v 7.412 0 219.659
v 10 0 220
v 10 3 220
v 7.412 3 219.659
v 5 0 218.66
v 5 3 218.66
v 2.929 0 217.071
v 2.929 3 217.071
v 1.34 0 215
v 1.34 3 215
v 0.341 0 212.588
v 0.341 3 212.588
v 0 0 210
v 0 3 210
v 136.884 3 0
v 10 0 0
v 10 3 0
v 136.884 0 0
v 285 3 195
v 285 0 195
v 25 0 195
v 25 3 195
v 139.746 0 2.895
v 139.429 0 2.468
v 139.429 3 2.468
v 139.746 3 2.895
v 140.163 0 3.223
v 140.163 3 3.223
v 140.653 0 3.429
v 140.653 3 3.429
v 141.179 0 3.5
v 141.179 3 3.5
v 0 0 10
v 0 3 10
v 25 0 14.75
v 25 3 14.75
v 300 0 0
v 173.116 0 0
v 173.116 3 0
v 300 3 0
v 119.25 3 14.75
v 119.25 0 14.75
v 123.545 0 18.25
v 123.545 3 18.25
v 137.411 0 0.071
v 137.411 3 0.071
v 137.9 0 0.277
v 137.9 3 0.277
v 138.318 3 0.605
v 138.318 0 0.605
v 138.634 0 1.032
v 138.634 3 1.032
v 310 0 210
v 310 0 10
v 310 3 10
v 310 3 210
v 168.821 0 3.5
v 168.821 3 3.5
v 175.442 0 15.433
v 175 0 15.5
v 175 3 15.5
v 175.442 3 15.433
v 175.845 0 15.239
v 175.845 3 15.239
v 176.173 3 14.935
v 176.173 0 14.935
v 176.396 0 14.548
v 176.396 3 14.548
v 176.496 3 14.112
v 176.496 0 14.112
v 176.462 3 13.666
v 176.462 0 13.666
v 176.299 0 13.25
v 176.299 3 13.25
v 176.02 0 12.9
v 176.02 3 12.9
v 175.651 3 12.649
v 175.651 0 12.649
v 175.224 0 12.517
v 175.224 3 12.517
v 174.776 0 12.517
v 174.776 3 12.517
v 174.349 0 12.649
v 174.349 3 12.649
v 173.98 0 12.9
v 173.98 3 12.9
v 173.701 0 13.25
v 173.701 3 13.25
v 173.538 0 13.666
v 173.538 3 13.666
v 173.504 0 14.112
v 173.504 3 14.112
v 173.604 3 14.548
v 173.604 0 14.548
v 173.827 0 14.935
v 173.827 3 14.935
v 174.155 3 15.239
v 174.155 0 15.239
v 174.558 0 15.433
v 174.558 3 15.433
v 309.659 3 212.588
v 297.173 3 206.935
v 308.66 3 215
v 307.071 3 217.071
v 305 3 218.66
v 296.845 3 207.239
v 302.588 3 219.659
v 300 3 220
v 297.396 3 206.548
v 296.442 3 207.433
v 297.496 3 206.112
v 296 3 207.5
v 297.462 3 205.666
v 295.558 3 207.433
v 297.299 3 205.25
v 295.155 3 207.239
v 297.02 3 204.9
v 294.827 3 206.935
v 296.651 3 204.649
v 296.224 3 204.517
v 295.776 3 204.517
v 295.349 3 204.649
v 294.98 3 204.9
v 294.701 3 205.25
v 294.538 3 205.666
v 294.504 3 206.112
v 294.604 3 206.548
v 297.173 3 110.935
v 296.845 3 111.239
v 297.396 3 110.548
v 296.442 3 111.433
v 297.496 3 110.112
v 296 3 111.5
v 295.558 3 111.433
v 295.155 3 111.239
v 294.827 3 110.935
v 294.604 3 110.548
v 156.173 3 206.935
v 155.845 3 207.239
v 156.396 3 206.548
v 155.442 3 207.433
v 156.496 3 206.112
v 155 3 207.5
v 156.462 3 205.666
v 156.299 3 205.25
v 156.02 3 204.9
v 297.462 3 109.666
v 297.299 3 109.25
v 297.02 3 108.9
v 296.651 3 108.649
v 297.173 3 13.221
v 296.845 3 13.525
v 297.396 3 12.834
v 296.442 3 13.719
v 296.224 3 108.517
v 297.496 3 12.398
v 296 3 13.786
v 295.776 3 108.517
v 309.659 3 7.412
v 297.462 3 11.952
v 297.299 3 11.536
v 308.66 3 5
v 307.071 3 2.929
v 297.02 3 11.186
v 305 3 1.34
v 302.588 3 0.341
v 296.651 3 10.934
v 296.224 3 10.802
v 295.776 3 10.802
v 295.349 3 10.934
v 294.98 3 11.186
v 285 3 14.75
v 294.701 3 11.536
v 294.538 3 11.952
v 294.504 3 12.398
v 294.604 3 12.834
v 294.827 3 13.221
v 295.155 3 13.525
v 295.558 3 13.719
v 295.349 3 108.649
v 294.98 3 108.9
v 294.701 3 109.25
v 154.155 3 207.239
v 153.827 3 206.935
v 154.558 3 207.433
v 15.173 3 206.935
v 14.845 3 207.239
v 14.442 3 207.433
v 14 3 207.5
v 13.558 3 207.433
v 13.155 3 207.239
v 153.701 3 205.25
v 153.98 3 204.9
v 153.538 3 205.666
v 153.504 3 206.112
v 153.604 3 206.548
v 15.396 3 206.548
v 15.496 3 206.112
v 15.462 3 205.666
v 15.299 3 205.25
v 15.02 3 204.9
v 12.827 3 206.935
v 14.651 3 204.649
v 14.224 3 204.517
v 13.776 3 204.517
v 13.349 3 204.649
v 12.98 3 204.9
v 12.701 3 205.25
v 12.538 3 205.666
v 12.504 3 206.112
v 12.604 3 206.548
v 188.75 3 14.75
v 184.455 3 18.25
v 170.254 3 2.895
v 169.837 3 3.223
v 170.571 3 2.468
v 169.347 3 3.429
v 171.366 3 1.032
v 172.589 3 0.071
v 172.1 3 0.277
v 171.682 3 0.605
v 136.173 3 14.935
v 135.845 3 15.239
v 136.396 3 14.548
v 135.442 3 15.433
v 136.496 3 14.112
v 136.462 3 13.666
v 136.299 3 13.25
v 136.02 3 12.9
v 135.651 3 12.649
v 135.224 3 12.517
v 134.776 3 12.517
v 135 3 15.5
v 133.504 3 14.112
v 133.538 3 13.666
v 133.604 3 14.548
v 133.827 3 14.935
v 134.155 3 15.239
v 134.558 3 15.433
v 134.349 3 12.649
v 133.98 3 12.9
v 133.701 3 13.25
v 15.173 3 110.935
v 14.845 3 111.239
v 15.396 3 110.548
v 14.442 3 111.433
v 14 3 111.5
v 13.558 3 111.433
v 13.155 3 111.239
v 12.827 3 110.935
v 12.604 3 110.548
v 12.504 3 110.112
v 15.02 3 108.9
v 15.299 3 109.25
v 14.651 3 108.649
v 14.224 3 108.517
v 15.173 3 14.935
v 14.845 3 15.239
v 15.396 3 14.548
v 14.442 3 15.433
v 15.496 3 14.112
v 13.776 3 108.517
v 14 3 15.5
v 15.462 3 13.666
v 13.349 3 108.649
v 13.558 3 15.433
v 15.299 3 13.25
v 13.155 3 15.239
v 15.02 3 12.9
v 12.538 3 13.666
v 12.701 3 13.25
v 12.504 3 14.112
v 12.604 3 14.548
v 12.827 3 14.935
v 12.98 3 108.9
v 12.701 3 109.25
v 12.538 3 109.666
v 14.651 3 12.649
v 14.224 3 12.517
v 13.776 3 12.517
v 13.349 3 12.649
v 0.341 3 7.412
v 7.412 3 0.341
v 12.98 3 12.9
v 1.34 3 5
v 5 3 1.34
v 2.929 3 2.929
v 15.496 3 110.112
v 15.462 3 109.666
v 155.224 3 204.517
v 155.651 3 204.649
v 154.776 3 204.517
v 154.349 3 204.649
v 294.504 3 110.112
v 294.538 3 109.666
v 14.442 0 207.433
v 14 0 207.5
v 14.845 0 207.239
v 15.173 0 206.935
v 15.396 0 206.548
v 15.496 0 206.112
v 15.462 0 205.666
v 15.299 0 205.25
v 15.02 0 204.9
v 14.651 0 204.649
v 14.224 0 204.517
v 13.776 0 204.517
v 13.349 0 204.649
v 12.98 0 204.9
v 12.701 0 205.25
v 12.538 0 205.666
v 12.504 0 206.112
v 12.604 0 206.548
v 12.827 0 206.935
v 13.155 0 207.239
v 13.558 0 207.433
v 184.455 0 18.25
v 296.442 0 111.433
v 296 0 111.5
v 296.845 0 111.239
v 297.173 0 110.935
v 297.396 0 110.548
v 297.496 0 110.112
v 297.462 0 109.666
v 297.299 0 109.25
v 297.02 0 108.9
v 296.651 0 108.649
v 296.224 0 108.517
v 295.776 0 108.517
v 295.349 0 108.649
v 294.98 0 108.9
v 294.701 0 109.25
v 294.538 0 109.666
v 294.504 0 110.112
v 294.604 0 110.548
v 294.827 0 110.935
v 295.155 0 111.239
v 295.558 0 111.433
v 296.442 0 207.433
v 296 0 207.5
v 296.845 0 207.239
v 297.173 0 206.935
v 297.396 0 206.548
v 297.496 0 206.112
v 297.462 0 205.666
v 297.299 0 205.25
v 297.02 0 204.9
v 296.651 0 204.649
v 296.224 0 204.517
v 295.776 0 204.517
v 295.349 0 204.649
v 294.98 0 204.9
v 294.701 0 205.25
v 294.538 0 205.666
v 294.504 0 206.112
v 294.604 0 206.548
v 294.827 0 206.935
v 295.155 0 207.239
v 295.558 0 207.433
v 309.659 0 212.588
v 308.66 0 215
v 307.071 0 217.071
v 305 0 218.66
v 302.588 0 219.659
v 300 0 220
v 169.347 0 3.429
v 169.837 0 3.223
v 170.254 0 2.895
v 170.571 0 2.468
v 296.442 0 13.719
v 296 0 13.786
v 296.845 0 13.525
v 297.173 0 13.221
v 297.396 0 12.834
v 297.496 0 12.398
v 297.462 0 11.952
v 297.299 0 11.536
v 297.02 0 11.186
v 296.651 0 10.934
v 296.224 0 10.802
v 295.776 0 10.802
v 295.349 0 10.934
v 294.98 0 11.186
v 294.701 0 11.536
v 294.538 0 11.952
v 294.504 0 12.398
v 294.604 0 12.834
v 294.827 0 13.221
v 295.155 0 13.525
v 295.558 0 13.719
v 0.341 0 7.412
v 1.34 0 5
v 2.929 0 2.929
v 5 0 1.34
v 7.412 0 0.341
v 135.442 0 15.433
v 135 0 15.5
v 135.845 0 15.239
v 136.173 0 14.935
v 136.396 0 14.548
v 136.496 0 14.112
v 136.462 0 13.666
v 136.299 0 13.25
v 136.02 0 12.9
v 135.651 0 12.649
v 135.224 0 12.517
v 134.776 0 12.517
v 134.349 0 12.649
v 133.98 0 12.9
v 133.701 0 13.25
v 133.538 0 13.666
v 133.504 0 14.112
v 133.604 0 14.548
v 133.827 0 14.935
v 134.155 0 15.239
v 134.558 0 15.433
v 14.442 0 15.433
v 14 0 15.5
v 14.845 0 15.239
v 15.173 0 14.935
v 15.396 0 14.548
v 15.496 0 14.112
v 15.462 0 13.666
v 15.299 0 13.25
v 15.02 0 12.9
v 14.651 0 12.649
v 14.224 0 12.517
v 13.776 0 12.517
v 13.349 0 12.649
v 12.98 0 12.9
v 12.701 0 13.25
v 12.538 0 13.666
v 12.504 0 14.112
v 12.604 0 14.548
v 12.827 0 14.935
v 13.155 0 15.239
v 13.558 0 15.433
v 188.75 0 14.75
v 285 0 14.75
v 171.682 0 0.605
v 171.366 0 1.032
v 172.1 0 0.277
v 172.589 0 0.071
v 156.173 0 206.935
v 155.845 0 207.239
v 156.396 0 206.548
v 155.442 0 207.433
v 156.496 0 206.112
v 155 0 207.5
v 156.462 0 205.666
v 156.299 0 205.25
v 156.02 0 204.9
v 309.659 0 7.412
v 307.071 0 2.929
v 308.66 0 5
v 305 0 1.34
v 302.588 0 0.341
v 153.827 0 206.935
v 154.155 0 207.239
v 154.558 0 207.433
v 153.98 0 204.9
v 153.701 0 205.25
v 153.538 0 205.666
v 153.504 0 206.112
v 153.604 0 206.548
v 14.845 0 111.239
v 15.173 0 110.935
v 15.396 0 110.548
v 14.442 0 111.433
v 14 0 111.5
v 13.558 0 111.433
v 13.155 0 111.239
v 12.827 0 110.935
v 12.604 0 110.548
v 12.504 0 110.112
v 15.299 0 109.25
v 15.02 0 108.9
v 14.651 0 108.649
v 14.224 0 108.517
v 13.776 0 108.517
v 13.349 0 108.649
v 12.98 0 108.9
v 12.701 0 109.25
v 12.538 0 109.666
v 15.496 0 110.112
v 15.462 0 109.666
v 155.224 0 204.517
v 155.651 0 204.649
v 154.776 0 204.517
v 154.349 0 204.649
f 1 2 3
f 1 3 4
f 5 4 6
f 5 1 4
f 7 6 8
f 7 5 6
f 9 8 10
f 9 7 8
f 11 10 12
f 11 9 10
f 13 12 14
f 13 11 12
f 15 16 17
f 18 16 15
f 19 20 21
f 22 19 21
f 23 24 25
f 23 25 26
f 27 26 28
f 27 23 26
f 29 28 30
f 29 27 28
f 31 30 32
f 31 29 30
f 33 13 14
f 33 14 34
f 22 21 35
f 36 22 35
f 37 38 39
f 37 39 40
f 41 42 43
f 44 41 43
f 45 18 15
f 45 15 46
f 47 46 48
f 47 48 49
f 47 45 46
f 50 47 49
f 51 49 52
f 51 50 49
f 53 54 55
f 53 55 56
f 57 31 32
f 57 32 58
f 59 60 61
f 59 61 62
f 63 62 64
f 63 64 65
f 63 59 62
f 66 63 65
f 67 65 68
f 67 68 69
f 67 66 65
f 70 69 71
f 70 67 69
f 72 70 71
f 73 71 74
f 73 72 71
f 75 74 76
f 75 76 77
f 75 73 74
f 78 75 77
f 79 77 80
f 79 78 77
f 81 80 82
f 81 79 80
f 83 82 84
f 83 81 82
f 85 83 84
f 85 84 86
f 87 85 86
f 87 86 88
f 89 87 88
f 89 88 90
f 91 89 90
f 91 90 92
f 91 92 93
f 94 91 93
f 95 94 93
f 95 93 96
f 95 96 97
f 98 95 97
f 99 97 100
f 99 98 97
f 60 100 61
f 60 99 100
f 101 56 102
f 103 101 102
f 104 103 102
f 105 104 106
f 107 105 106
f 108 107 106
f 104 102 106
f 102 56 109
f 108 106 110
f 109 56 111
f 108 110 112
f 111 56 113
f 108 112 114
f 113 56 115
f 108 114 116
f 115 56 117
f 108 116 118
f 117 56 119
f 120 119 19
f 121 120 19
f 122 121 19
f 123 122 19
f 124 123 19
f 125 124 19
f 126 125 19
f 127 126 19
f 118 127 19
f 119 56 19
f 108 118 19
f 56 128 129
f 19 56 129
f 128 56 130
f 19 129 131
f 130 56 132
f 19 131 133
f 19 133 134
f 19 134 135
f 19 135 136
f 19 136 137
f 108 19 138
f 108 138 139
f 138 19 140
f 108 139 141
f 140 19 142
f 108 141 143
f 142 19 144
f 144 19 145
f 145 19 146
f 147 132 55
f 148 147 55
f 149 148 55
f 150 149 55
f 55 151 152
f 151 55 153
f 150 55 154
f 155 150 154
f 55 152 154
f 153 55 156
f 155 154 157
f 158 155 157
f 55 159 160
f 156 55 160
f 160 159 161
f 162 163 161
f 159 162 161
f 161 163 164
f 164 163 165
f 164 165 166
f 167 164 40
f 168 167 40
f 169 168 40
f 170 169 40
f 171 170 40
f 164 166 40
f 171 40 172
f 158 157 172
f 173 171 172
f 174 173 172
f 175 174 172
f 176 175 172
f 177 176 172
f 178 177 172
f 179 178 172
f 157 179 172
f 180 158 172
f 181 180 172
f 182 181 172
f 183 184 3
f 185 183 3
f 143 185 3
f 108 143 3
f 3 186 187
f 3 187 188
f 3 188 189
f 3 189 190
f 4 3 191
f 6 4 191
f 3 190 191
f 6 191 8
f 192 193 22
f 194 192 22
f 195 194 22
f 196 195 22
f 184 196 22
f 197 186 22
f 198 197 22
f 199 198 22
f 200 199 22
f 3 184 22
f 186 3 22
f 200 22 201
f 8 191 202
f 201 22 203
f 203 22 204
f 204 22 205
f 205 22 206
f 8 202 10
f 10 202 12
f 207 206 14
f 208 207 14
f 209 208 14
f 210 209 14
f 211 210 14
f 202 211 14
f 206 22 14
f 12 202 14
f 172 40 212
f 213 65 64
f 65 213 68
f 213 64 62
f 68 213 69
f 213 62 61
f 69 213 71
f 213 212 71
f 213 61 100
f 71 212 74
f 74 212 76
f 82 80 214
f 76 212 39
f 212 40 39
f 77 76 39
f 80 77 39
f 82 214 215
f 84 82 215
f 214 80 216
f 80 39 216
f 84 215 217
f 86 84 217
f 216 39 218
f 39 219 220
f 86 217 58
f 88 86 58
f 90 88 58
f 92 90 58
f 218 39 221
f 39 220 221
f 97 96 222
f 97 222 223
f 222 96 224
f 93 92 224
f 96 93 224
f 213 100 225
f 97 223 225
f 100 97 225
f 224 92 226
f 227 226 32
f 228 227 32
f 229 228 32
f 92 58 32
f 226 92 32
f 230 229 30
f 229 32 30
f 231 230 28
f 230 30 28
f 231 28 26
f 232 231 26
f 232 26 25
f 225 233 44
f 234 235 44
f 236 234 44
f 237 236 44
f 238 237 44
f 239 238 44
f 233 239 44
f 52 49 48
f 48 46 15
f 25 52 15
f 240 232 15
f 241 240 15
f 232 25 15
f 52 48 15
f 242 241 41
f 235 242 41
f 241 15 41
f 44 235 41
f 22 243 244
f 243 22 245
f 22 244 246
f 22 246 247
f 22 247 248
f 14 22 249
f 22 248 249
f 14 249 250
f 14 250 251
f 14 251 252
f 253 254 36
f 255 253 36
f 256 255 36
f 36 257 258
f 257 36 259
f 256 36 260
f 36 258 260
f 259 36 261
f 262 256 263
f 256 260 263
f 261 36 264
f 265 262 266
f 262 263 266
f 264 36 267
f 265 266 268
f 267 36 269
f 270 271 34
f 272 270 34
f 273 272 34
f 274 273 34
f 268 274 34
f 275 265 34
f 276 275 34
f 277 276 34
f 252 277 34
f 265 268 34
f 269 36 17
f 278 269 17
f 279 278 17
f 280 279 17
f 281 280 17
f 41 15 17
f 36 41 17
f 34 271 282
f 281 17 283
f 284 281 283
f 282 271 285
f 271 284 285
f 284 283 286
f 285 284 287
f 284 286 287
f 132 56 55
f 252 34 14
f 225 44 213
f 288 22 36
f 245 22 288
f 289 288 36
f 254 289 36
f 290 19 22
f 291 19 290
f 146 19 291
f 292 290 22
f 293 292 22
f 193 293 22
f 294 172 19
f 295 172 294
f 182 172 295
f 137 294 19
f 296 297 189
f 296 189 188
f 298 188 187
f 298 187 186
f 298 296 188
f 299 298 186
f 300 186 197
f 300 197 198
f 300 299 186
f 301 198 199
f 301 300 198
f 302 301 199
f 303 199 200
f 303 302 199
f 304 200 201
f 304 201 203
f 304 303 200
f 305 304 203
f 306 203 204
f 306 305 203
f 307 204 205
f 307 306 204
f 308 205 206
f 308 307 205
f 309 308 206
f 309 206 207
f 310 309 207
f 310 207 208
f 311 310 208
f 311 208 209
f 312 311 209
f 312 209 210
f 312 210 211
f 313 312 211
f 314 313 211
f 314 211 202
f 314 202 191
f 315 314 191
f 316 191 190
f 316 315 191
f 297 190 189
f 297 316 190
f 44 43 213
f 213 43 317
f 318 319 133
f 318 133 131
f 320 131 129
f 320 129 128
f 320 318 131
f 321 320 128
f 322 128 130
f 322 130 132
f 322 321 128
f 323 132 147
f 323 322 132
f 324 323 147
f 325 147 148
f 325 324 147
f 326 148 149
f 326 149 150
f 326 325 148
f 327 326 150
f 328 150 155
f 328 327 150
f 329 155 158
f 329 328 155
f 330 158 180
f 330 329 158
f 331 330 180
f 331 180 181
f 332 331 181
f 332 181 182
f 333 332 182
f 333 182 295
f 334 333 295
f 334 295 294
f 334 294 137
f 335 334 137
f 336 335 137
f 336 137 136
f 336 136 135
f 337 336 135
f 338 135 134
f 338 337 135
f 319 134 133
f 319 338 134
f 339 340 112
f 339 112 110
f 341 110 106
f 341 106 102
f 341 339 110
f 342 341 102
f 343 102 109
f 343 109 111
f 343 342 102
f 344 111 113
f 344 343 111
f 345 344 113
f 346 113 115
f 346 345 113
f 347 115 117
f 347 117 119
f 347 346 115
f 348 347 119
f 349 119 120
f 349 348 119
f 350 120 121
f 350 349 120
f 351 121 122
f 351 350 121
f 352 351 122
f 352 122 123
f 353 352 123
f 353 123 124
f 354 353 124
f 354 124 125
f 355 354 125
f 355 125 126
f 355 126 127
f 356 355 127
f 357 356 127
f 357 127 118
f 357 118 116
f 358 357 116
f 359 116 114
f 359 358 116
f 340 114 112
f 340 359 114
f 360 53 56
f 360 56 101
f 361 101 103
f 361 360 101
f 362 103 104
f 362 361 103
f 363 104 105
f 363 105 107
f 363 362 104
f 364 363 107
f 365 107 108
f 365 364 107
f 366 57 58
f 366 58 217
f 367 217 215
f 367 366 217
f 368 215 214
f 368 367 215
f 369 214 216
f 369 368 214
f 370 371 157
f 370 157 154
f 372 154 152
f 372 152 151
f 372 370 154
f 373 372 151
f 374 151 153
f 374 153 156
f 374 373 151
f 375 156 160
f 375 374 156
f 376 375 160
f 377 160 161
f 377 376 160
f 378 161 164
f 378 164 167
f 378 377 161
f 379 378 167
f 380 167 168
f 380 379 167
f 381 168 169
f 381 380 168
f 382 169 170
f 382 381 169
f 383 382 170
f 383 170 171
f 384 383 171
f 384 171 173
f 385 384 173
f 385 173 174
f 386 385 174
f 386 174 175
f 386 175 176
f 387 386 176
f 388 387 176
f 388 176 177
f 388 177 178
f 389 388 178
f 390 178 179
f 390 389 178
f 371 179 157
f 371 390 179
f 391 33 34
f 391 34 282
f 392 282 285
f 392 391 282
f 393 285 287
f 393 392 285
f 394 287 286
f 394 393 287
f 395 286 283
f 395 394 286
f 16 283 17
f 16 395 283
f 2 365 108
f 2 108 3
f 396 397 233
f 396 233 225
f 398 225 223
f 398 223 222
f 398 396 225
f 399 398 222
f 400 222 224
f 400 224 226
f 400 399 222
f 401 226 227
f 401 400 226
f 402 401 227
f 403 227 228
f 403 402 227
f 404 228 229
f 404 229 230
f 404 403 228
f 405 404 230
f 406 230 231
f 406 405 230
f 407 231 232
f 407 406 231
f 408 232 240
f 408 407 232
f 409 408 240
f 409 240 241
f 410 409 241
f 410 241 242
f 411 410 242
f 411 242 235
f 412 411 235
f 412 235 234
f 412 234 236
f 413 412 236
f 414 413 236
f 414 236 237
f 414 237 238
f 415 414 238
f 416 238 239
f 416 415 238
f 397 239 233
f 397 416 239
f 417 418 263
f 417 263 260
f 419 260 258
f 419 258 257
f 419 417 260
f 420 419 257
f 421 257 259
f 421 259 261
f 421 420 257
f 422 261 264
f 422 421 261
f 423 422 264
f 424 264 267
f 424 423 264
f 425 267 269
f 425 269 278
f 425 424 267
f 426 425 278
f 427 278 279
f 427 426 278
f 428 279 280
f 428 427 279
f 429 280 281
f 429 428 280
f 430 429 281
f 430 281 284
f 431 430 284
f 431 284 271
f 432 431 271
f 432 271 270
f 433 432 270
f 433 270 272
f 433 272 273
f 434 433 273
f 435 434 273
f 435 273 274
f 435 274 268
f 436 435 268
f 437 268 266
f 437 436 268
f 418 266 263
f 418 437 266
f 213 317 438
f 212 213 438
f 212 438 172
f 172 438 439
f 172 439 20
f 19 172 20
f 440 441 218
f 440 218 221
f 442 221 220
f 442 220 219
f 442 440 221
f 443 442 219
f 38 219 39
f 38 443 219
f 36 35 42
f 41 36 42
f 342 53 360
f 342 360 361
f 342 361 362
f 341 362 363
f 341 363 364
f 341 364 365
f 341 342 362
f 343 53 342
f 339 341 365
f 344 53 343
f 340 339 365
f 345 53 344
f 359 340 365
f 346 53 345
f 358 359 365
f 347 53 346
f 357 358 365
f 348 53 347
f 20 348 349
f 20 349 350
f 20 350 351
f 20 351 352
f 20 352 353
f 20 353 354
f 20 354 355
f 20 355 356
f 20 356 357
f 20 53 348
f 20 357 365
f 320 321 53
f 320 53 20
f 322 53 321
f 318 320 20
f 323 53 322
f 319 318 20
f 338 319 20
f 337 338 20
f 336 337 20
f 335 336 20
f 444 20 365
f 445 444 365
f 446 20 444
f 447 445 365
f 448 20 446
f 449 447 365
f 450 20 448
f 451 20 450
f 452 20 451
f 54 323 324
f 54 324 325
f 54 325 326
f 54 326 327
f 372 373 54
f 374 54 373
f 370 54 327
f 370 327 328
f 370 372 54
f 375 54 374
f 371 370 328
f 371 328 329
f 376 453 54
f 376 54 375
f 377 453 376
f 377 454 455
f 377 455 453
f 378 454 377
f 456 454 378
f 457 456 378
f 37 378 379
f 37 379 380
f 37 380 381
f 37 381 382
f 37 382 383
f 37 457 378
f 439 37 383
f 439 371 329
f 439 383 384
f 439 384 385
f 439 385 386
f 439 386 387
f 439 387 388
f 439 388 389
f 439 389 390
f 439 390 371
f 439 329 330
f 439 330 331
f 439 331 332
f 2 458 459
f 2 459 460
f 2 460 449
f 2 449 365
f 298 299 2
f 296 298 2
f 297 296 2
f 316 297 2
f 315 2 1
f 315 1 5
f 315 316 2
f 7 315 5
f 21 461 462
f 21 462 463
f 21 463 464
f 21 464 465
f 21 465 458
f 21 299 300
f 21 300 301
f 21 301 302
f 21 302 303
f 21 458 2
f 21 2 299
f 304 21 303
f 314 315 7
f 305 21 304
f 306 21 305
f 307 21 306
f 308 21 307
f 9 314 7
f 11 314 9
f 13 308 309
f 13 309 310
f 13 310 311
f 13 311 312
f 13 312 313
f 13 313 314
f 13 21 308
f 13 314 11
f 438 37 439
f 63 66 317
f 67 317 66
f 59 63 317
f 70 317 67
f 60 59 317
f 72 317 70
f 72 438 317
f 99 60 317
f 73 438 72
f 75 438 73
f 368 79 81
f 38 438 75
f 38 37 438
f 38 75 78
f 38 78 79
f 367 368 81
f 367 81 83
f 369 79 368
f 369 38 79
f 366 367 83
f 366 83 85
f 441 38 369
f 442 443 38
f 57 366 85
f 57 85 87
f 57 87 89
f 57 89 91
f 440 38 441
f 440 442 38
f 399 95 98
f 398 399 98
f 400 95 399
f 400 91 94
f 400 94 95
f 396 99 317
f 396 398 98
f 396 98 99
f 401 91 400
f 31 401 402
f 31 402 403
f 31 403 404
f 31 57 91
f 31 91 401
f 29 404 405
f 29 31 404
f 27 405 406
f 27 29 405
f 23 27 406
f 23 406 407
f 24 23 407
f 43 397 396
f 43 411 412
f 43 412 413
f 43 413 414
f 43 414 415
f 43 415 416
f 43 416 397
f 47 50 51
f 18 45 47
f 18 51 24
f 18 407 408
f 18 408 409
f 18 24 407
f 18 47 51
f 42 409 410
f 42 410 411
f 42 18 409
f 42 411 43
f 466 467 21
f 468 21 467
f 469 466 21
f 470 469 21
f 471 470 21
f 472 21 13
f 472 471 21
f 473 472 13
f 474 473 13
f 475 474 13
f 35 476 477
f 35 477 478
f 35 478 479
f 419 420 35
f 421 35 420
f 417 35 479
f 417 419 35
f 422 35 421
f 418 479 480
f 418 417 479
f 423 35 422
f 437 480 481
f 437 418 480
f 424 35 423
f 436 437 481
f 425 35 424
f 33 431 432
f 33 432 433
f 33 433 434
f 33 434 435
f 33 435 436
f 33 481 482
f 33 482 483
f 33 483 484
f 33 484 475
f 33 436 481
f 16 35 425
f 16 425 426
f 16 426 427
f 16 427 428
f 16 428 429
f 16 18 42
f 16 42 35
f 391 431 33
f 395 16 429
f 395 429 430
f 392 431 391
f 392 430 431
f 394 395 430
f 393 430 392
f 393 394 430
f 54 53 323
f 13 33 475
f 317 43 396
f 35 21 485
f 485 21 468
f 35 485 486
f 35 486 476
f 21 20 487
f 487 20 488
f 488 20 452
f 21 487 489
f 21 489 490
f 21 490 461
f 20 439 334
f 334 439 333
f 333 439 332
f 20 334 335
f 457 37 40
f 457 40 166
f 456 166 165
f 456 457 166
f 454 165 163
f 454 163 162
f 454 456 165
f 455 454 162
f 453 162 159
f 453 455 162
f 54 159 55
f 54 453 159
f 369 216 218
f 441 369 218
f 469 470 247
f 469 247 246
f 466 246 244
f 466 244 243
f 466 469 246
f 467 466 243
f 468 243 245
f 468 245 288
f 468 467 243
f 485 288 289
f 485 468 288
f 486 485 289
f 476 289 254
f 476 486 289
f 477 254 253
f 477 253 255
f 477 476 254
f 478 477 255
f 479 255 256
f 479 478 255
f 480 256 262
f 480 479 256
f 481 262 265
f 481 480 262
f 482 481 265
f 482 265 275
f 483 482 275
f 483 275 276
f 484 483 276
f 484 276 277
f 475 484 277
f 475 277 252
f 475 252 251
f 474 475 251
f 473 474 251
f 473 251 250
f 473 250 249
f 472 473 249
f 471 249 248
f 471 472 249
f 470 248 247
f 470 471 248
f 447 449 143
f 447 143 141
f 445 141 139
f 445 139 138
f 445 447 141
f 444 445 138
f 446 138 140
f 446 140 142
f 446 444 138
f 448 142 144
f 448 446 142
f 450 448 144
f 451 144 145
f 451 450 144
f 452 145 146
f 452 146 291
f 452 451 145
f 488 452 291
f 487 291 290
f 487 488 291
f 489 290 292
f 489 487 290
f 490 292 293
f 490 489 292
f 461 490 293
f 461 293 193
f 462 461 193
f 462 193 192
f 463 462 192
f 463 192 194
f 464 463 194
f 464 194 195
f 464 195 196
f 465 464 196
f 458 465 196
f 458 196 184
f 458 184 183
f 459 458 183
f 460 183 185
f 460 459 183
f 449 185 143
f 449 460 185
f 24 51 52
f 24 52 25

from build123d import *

# Parameters (mm, degrees)
SKETCH_1_R      = 1.5
EXTRUDE_1_DEPTH = 3


with BuildPart() as part:
    # 草图1 → 凸台-拉伸1 (new body)
    with BuildSketch(Plane(origin=(0, 0, 0), x_dir=(1, 0, 0), z_dir=(0, 1, 0))):
        with BuildLine():
            Line((10, 0), (136.884360712, 0))
            ThreePointArc((136.884360712, 0), (137.900113715, -0.277140216), (138.634360712, -1.031754163))
            Line((138.634360712, -1.031754163), (139.429147615, -2.468245837))
            ThreePointArc((139.429147615, -2.468245837), (140.163394612, -3.222859784), (141.179147615, -3.5))
            Line((141.179147615, -3.5), (168.820852385, -3.5))
            ThreePointArc((168.820852385, -3.5), (169.836605388, -3.222859784), (170.570852385, -2.468245837))
            Line((170.570852385, -2.468245837), (171.365639288, -1.031754163))
            ThreePointArc((171.365639288, -1.031754163), (172.099886285, -0.277140216), (173.115639288, 0))
            Line((173.115639288, 0), (300, 0))
            ThreePointArc((300, 0), (307.071067812, -2.928932188), (310, -10))
            Line((310, -10), (310, -210))
            ThreePointArc((310, -210), (307.071067812, -217.071067812), (300, -220))
            Line((300, -220), (10, -220))
            ThreePointArc((10, -220), (2.928932188, -217.071067812), (0, -210))
            Line((0, -210), (0, -10))
            ThreePointArc((0, -10), (2.928932188, -2.928932188), (10, 0))
        make_face()
        with Locations(Location((14, -14, 0), (0, 0, 270))):
            Circle(SKETCH_1_R, mode=Mode.SUBTRACT)
        with Locations(Location((14, -206, 0), (0, 0, 270))):
            Circle(SKETCH_1_R, mode=Mode.SUBTRACT)
        with Locations(Location((296, -206, 0), (0, 0, 270))):
            Circle(SKETCH_1_R, mode=Mode.SUBTRACT)
        with Locations(Location((296, -12.28568254, 0), (0, 0, 270))):
            Circle(SKETCH_1_R, mode=Mode.SUBTRACT)
        with Locations(Location((155, -206, 0), (0, 0, 270))):
            Circle(SKETCH_1_R, mode=Mode.SUBTRACT)
        with Locations(Location((175, -14, 0), (0, 0, 270))):
            Circle(SKETCH_1_R, mode=Mode.SUBTRACT)
        with Locations(Location((135, -14, 0), (0, 0, 270))):
            Circle(SKETCH_1_R, mode=Mode.SUBTRACT)
        with Locations(Location((296, -110, 0), (0, 0, 270))):
            Circle(SKETCH_1_R, mode=Mode.SUBTRACT)
        with Locations(Location((14, -110, 0), (0, 0, 270))):
            Circle(SKETCH_1_R, mode=Mode.SUBTRACT)
        Polygon((184.455213096, -18.25), (188.75, -14.75), (285, -14.75), (285, -195), (25, -195), (25, -14.75), (119.25, -14.75), (123.544786904, -18.25), (141.179147615, -18.25), (168.820852385, -18.25), align=None, mode=Mode.SUBTRACT)
    extrude(amount=EXTRUDE_1_DEPTH)


solid = part.part
